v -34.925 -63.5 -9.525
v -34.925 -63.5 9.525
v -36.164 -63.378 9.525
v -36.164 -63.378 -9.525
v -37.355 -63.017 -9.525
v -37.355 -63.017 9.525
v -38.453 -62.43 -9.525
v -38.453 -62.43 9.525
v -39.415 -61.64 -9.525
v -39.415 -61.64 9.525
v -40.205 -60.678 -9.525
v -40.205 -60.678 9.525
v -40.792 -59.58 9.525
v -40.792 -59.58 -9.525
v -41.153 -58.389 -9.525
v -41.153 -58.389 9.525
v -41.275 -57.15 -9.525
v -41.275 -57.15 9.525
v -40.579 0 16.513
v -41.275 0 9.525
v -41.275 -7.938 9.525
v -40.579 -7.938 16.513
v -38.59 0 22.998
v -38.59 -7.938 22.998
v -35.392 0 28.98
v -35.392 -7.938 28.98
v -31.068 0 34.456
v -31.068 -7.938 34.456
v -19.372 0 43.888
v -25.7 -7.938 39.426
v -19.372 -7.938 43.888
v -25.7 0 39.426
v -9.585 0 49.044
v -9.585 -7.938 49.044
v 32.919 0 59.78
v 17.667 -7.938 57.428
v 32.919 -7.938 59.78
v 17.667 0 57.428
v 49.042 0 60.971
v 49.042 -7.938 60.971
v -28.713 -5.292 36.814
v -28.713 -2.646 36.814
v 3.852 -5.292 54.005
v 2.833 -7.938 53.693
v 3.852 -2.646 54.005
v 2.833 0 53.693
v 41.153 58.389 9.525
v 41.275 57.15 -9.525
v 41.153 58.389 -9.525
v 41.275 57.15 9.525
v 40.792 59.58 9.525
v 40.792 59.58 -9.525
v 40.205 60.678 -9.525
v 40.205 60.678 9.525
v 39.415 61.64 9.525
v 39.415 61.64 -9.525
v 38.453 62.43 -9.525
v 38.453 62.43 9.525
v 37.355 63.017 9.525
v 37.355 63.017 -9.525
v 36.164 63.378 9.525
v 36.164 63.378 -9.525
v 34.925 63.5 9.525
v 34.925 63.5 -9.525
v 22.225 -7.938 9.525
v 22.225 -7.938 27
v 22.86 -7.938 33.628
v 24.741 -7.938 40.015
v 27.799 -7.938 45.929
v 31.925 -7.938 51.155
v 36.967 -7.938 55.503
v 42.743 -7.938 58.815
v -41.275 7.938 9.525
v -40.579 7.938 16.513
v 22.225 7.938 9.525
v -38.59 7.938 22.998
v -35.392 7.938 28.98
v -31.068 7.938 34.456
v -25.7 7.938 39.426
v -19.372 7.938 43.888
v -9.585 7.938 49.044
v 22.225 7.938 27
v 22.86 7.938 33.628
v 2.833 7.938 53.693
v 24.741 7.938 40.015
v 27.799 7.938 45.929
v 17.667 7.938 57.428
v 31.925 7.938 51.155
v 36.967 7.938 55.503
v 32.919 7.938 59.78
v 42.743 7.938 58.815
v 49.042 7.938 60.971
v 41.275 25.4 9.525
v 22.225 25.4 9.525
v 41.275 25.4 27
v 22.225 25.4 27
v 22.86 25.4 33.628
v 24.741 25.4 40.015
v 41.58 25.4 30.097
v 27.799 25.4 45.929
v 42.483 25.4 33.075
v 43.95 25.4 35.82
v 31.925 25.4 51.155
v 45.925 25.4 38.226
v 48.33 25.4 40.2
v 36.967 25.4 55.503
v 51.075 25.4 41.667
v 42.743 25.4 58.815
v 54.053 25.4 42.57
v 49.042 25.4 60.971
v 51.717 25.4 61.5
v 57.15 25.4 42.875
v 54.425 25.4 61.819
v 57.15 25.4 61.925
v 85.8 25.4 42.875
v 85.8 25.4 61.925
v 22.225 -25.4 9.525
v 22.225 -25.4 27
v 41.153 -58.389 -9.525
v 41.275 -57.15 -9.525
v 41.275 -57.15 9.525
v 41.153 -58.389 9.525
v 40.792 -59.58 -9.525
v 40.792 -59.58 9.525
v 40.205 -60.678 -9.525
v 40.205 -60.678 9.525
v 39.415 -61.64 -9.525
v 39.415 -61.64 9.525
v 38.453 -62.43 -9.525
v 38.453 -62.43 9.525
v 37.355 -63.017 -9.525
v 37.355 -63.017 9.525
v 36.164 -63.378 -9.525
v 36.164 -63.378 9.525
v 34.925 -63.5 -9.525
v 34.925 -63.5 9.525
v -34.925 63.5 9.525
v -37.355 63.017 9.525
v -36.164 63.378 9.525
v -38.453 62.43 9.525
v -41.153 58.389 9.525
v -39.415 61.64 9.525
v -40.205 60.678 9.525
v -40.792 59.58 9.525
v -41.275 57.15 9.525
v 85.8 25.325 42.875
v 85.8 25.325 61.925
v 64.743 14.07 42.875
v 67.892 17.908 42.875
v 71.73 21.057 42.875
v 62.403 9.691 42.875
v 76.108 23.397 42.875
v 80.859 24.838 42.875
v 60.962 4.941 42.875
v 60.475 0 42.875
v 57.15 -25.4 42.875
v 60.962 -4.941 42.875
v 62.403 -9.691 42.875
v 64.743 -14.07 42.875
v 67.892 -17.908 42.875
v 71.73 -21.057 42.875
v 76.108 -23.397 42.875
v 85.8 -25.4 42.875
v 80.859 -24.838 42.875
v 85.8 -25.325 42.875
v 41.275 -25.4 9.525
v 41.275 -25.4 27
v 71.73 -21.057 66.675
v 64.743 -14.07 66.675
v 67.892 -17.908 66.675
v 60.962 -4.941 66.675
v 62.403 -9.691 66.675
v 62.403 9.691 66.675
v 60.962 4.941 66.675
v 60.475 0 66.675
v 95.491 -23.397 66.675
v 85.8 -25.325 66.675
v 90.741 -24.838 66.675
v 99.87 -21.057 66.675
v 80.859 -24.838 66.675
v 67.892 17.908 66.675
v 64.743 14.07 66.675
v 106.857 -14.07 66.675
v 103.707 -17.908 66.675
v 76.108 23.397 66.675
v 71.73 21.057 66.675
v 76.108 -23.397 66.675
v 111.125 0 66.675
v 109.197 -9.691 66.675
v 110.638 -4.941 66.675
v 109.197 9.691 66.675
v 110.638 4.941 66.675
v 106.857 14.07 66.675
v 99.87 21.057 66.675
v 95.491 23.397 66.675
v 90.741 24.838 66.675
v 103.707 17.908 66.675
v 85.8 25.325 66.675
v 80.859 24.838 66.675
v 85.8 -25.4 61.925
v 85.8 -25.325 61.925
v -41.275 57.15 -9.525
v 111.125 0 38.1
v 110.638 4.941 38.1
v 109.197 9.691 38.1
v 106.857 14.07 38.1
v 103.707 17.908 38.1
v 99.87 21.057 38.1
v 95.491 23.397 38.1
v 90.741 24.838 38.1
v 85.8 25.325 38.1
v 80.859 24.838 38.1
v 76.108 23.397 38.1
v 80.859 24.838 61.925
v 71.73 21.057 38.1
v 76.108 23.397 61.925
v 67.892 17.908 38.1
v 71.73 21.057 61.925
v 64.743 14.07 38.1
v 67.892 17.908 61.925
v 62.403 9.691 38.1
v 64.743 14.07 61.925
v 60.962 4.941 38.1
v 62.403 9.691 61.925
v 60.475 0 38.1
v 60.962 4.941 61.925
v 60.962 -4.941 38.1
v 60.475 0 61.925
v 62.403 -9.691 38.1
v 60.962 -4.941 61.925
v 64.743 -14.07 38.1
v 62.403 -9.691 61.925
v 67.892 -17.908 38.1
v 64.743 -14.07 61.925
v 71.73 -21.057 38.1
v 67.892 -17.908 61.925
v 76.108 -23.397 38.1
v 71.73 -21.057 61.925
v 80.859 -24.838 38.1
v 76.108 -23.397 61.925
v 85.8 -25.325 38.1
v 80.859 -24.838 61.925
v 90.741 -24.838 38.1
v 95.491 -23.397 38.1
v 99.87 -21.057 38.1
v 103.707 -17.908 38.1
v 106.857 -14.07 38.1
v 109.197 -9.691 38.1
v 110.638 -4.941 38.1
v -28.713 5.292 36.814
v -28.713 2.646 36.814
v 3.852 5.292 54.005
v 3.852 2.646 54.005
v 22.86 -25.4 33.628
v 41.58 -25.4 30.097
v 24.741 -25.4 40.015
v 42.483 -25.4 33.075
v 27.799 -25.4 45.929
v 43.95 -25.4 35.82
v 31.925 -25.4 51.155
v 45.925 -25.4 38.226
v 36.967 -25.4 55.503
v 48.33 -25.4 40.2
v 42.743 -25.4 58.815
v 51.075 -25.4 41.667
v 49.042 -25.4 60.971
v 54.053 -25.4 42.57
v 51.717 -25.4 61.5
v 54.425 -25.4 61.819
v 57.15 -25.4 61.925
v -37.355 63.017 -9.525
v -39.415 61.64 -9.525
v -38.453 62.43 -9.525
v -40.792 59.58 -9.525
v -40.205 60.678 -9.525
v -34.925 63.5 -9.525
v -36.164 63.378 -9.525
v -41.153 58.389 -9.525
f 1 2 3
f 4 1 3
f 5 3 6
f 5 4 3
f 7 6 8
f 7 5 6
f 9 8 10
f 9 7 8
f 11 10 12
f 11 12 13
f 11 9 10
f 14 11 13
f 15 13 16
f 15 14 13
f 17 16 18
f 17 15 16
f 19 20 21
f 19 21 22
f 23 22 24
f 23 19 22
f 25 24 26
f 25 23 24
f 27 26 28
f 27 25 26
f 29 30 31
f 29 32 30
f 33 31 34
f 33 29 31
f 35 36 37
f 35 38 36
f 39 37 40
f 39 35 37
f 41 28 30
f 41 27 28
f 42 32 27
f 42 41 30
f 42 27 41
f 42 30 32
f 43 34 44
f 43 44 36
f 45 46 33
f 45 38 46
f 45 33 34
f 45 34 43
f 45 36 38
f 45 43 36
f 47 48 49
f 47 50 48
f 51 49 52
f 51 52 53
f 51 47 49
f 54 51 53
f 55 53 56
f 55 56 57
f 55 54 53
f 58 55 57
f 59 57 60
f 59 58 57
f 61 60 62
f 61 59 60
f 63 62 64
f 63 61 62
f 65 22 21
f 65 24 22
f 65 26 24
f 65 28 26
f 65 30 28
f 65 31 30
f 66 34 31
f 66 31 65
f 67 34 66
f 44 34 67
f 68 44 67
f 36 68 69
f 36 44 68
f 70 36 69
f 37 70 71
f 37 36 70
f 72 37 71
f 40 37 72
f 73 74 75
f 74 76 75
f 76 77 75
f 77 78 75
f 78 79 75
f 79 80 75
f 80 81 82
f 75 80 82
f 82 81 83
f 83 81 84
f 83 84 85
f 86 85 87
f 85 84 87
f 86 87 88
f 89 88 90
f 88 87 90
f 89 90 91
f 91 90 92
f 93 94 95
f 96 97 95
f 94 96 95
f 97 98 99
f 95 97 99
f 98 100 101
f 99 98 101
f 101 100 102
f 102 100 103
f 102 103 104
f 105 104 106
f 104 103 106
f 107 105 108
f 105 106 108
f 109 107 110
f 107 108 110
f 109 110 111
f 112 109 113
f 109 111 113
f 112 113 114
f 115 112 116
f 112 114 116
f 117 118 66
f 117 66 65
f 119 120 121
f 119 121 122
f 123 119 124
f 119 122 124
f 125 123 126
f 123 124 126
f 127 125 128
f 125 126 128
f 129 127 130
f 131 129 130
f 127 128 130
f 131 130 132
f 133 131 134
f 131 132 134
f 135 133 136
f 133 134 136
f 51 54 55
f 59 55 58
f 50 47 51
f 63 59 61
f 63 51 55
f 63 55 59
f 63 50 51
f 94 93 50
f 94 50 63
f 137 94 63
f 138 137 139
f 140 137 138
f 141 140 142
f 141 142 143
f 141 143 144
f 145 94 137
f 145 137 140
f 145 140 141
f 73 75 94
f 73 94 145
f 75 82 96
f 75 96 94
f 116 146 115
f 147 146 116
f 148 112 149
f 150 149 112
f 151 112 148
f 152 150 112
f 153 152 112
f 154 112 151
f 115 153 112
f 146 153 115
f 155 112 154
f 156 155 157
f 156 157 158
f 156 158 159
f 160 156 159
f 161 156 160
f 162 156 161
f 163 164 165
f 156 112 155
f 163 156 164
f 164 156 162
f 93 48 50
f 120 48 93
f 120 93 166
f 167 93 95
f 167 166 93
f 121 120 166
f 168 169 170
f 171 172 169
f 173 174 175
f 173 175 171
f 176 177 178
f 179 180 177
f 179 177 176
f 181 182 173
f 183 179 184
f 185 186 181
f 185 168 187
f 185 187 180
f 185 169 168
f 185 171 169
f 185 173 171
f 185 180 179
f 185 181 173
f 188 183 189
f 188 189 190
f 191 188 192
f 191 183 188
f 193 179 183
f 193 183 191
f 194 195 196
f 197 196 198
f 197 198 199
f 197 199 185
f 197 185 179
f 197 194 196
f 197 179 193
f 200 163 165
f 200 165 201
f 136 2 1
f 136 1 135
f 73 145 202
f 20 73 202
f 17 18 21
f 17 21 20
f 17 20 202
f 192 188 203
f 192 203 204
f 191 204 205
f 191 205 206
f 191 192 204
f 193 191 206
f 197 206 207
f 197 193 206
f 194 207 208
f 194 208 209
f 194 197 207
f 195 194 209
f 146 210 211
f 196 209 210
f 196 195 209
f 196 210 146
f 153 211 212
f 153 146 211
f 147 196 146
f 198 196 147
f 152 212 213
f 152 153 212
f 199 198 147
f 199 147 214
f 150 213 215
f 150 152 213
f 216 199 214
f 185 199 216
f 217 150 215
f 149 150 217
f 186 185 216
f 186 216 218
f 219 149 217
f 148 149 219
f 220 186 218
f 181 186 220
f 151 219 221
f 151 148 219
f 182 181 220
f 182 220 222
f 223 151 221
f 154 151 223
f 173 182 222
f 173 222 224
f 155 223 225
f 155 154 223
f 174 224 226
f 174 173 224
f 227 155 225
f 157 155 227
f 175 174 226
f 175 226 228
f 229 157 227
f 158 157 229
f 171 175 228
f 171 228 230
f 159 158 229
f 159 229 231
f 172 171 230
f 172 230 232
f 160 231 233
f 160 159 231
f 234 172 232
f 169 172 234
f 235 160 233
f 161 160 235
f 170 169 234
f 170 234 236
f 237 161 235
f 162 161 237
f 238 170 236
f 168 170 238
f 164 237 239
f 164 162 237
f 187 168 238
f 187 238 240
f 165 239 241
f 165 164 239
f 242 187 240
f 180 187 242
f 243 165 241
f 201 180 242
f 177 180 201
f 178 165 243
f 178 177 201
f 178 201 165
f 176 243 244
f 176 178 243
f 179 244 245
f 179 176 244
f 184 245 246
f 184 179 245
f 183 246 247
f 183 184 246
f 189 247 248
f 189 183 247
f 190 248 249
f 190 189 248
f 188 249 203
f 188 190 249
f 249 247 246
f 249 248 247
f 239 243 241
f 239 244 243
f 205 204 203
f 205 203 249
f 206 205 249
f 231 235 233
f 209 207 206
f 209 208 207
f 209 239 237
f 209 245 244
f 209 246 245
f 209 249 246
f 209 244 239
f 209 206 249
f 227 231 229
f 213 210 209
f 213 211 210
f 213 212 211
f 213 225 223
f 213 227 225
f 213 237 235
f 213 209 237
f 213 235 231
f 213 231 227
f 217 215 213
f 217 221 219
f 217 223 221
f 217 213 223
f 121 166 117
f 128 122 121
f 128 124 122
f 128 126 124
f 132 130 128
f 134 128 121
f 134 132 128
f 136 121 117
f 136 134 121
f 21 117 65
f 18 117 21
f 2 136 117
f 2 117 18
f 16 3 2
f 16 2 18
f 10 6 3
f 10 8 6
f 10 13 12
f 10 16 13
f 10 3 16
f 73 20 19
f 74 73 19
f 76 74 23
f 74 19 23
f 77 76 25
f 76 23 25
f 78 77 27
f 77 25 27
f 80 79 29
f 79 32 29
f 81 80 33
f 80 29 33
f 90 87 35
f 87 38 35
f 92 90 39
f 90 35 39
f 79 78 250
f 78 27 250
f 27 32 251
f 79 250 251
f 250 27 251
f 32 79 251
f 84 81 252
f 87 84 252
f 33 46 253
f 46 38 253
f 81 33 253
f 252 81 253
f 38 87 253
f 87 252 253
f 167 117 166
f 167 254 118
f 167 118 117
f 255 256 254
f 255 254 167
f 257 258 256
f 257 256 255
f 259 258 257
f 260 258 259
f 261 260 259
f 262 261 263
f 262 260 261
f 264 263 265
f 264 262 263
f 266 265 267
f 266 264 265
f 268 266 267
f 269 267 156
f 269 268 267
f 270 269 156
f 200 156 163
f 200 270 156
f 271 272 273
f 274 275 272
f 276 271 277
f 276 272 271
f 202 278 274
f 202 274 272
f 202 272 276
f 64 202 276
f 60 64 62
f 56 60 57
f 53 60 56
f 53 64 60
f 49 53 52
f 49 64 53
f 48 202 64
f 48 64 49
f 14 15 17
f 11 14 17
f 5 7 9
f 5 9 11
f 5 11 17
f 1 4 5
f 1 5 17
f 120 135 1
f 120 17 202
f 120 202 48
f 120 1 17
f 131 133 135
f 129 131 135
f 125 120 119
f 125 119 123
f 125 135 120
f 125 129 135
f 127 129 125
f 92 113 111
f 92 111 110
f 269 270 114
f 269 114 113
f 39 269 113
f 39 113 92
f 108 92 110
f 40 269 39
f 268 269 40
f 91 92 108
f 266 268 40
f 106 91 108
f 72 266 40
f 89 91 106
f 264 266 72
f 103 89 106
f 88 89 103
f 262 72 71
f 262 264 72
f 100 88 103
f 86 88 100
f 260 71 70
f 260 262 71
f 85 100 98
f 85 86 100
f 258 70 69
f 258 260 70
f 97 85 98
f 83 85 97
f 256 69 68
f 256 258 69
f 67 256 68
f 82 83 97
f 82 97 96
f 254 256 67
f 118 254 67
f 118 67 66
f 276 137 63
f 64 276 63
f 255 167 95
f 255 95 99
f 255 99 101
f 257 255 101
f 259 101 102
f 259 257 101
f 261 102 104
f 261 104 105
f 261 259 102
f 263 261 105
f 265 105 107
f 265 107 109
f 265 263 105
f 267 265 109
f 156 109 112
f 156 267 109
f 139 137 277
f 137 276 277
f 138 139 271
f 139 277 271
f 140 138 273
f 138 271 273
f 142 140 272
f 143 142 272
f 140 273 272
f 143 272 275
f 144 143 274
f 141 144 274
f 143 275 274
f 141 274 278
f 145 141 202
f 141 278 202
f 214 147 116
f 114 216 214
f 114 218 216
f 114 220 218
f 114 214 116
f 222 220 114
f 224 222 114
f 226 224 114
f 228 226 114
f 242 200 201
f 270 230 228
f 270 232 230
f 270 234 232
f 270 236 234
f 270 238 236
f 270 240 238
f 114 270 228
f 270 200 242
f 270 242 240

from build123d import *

# Parameters (mm, degrees)
F1_DEPTH = 63.5
F0_W     = 25.4749524852
F0_H     = 19.05
F2_DEPTH = 25.4
F3_DEPTH = 7.9375
F5_R     = 6.35


with BuildPart() as f1:
    # F0 (on Front) → F1 (new body, symmetric)
    with BuildSketch(Plane.XZ):
        Polygon((41.275, -9.525), (41.275, 9.525), (22.225, 9.525), (-41.275, 9.525), (-41.275, -9.525), align=None)
    extrude(amount=F1_DEPTH, both=True)

    # F0 (on Front) → F2 (join, symmetric)
    with BuildSketch(Plane.XZ):
        with BuildLine():
            Line((22.225, 9.525), (41.275, 9.525))
            Line((41.275, 9.525), (41.275, 27.0002))
            ThreePointArc((41.275, 27.0002), (45.9246798487, 38.2255201513), (57.15, 42.8752))
            Line((57.15, 42.8752), (60.325, 42.8752))
            Line((60.325, 42.8752), (60.325, 61.9252))
            Line((60.325, 61.9252), (57.15, 61.9252))
            ThreePointArc((57.15, 61.9252), (53.0680704253, 61.6858378916), (49.0420927056, 60.9710325524))
            ThreePointArc((49.0420927056, 60.9710325524), (29.7371901544, 48.6402896803), (22.225, 27.0002))
            Line((22.225, 27.0002), (22.225, 9.525))
        make_face()
        with Locations((73.0624762426, 52.4002)):
            Rectangle(F0_W, F0_H)
    extrude(amount=F2_DEPTH, both=True)

    # F0 (on Front) → F3 (join, symmetric)
    with BuildSketch(Plane.XZ):
        with BuildLine():
            Line((-41.275, 9.525), (22.225, 9.525))
            Line((22.225, 9.525), (22.225, 27.0002))
            ThreePointArc((22.225, 27.0002), (29.7371901544, 48.6402896803), (49.0420927056, 60.9710325524))
            add(Edge.make_bspline(
                [(-41.275, 9.525), (-41.1753505468, 41.8217629194), (0, 59.1593452108), (49.0420927056, 60.9710325524)],
                knots=[0, 0, 0, 0, 103.941673549, 103.941673549, 103.941673549, 103.941673549], degree=3))
        make_face()
    extrude(amount=F3_DEPTH, both=True)

    # F0 (on Front) → F4 (revolve)
    with BuildSketch(Plane.XZ):
        Polygon((85.7999524852, 61.9252), (85.7999524852, 42.8752), (85.7999524852, 38.1), (111.125, 38.1), (111.125, 66.675), (85.7999524852, 66.675), align=None)
    revolve(axis=Axis((85.7999524852, 0, 52.3875), (0, 0, 1)))

    # F5
    f5_edges = [f1.edges().sort_by_distance(p)[0] for p in [
        (41.275, -63.5, 0),
        (41.275, 63.5, 0),
        (-41.275, 63.5, 0),
        (-41.275, -63.5, 0),
    ]]
    fillet(f5_edges, radius=F5_R)


solid = f1.part
